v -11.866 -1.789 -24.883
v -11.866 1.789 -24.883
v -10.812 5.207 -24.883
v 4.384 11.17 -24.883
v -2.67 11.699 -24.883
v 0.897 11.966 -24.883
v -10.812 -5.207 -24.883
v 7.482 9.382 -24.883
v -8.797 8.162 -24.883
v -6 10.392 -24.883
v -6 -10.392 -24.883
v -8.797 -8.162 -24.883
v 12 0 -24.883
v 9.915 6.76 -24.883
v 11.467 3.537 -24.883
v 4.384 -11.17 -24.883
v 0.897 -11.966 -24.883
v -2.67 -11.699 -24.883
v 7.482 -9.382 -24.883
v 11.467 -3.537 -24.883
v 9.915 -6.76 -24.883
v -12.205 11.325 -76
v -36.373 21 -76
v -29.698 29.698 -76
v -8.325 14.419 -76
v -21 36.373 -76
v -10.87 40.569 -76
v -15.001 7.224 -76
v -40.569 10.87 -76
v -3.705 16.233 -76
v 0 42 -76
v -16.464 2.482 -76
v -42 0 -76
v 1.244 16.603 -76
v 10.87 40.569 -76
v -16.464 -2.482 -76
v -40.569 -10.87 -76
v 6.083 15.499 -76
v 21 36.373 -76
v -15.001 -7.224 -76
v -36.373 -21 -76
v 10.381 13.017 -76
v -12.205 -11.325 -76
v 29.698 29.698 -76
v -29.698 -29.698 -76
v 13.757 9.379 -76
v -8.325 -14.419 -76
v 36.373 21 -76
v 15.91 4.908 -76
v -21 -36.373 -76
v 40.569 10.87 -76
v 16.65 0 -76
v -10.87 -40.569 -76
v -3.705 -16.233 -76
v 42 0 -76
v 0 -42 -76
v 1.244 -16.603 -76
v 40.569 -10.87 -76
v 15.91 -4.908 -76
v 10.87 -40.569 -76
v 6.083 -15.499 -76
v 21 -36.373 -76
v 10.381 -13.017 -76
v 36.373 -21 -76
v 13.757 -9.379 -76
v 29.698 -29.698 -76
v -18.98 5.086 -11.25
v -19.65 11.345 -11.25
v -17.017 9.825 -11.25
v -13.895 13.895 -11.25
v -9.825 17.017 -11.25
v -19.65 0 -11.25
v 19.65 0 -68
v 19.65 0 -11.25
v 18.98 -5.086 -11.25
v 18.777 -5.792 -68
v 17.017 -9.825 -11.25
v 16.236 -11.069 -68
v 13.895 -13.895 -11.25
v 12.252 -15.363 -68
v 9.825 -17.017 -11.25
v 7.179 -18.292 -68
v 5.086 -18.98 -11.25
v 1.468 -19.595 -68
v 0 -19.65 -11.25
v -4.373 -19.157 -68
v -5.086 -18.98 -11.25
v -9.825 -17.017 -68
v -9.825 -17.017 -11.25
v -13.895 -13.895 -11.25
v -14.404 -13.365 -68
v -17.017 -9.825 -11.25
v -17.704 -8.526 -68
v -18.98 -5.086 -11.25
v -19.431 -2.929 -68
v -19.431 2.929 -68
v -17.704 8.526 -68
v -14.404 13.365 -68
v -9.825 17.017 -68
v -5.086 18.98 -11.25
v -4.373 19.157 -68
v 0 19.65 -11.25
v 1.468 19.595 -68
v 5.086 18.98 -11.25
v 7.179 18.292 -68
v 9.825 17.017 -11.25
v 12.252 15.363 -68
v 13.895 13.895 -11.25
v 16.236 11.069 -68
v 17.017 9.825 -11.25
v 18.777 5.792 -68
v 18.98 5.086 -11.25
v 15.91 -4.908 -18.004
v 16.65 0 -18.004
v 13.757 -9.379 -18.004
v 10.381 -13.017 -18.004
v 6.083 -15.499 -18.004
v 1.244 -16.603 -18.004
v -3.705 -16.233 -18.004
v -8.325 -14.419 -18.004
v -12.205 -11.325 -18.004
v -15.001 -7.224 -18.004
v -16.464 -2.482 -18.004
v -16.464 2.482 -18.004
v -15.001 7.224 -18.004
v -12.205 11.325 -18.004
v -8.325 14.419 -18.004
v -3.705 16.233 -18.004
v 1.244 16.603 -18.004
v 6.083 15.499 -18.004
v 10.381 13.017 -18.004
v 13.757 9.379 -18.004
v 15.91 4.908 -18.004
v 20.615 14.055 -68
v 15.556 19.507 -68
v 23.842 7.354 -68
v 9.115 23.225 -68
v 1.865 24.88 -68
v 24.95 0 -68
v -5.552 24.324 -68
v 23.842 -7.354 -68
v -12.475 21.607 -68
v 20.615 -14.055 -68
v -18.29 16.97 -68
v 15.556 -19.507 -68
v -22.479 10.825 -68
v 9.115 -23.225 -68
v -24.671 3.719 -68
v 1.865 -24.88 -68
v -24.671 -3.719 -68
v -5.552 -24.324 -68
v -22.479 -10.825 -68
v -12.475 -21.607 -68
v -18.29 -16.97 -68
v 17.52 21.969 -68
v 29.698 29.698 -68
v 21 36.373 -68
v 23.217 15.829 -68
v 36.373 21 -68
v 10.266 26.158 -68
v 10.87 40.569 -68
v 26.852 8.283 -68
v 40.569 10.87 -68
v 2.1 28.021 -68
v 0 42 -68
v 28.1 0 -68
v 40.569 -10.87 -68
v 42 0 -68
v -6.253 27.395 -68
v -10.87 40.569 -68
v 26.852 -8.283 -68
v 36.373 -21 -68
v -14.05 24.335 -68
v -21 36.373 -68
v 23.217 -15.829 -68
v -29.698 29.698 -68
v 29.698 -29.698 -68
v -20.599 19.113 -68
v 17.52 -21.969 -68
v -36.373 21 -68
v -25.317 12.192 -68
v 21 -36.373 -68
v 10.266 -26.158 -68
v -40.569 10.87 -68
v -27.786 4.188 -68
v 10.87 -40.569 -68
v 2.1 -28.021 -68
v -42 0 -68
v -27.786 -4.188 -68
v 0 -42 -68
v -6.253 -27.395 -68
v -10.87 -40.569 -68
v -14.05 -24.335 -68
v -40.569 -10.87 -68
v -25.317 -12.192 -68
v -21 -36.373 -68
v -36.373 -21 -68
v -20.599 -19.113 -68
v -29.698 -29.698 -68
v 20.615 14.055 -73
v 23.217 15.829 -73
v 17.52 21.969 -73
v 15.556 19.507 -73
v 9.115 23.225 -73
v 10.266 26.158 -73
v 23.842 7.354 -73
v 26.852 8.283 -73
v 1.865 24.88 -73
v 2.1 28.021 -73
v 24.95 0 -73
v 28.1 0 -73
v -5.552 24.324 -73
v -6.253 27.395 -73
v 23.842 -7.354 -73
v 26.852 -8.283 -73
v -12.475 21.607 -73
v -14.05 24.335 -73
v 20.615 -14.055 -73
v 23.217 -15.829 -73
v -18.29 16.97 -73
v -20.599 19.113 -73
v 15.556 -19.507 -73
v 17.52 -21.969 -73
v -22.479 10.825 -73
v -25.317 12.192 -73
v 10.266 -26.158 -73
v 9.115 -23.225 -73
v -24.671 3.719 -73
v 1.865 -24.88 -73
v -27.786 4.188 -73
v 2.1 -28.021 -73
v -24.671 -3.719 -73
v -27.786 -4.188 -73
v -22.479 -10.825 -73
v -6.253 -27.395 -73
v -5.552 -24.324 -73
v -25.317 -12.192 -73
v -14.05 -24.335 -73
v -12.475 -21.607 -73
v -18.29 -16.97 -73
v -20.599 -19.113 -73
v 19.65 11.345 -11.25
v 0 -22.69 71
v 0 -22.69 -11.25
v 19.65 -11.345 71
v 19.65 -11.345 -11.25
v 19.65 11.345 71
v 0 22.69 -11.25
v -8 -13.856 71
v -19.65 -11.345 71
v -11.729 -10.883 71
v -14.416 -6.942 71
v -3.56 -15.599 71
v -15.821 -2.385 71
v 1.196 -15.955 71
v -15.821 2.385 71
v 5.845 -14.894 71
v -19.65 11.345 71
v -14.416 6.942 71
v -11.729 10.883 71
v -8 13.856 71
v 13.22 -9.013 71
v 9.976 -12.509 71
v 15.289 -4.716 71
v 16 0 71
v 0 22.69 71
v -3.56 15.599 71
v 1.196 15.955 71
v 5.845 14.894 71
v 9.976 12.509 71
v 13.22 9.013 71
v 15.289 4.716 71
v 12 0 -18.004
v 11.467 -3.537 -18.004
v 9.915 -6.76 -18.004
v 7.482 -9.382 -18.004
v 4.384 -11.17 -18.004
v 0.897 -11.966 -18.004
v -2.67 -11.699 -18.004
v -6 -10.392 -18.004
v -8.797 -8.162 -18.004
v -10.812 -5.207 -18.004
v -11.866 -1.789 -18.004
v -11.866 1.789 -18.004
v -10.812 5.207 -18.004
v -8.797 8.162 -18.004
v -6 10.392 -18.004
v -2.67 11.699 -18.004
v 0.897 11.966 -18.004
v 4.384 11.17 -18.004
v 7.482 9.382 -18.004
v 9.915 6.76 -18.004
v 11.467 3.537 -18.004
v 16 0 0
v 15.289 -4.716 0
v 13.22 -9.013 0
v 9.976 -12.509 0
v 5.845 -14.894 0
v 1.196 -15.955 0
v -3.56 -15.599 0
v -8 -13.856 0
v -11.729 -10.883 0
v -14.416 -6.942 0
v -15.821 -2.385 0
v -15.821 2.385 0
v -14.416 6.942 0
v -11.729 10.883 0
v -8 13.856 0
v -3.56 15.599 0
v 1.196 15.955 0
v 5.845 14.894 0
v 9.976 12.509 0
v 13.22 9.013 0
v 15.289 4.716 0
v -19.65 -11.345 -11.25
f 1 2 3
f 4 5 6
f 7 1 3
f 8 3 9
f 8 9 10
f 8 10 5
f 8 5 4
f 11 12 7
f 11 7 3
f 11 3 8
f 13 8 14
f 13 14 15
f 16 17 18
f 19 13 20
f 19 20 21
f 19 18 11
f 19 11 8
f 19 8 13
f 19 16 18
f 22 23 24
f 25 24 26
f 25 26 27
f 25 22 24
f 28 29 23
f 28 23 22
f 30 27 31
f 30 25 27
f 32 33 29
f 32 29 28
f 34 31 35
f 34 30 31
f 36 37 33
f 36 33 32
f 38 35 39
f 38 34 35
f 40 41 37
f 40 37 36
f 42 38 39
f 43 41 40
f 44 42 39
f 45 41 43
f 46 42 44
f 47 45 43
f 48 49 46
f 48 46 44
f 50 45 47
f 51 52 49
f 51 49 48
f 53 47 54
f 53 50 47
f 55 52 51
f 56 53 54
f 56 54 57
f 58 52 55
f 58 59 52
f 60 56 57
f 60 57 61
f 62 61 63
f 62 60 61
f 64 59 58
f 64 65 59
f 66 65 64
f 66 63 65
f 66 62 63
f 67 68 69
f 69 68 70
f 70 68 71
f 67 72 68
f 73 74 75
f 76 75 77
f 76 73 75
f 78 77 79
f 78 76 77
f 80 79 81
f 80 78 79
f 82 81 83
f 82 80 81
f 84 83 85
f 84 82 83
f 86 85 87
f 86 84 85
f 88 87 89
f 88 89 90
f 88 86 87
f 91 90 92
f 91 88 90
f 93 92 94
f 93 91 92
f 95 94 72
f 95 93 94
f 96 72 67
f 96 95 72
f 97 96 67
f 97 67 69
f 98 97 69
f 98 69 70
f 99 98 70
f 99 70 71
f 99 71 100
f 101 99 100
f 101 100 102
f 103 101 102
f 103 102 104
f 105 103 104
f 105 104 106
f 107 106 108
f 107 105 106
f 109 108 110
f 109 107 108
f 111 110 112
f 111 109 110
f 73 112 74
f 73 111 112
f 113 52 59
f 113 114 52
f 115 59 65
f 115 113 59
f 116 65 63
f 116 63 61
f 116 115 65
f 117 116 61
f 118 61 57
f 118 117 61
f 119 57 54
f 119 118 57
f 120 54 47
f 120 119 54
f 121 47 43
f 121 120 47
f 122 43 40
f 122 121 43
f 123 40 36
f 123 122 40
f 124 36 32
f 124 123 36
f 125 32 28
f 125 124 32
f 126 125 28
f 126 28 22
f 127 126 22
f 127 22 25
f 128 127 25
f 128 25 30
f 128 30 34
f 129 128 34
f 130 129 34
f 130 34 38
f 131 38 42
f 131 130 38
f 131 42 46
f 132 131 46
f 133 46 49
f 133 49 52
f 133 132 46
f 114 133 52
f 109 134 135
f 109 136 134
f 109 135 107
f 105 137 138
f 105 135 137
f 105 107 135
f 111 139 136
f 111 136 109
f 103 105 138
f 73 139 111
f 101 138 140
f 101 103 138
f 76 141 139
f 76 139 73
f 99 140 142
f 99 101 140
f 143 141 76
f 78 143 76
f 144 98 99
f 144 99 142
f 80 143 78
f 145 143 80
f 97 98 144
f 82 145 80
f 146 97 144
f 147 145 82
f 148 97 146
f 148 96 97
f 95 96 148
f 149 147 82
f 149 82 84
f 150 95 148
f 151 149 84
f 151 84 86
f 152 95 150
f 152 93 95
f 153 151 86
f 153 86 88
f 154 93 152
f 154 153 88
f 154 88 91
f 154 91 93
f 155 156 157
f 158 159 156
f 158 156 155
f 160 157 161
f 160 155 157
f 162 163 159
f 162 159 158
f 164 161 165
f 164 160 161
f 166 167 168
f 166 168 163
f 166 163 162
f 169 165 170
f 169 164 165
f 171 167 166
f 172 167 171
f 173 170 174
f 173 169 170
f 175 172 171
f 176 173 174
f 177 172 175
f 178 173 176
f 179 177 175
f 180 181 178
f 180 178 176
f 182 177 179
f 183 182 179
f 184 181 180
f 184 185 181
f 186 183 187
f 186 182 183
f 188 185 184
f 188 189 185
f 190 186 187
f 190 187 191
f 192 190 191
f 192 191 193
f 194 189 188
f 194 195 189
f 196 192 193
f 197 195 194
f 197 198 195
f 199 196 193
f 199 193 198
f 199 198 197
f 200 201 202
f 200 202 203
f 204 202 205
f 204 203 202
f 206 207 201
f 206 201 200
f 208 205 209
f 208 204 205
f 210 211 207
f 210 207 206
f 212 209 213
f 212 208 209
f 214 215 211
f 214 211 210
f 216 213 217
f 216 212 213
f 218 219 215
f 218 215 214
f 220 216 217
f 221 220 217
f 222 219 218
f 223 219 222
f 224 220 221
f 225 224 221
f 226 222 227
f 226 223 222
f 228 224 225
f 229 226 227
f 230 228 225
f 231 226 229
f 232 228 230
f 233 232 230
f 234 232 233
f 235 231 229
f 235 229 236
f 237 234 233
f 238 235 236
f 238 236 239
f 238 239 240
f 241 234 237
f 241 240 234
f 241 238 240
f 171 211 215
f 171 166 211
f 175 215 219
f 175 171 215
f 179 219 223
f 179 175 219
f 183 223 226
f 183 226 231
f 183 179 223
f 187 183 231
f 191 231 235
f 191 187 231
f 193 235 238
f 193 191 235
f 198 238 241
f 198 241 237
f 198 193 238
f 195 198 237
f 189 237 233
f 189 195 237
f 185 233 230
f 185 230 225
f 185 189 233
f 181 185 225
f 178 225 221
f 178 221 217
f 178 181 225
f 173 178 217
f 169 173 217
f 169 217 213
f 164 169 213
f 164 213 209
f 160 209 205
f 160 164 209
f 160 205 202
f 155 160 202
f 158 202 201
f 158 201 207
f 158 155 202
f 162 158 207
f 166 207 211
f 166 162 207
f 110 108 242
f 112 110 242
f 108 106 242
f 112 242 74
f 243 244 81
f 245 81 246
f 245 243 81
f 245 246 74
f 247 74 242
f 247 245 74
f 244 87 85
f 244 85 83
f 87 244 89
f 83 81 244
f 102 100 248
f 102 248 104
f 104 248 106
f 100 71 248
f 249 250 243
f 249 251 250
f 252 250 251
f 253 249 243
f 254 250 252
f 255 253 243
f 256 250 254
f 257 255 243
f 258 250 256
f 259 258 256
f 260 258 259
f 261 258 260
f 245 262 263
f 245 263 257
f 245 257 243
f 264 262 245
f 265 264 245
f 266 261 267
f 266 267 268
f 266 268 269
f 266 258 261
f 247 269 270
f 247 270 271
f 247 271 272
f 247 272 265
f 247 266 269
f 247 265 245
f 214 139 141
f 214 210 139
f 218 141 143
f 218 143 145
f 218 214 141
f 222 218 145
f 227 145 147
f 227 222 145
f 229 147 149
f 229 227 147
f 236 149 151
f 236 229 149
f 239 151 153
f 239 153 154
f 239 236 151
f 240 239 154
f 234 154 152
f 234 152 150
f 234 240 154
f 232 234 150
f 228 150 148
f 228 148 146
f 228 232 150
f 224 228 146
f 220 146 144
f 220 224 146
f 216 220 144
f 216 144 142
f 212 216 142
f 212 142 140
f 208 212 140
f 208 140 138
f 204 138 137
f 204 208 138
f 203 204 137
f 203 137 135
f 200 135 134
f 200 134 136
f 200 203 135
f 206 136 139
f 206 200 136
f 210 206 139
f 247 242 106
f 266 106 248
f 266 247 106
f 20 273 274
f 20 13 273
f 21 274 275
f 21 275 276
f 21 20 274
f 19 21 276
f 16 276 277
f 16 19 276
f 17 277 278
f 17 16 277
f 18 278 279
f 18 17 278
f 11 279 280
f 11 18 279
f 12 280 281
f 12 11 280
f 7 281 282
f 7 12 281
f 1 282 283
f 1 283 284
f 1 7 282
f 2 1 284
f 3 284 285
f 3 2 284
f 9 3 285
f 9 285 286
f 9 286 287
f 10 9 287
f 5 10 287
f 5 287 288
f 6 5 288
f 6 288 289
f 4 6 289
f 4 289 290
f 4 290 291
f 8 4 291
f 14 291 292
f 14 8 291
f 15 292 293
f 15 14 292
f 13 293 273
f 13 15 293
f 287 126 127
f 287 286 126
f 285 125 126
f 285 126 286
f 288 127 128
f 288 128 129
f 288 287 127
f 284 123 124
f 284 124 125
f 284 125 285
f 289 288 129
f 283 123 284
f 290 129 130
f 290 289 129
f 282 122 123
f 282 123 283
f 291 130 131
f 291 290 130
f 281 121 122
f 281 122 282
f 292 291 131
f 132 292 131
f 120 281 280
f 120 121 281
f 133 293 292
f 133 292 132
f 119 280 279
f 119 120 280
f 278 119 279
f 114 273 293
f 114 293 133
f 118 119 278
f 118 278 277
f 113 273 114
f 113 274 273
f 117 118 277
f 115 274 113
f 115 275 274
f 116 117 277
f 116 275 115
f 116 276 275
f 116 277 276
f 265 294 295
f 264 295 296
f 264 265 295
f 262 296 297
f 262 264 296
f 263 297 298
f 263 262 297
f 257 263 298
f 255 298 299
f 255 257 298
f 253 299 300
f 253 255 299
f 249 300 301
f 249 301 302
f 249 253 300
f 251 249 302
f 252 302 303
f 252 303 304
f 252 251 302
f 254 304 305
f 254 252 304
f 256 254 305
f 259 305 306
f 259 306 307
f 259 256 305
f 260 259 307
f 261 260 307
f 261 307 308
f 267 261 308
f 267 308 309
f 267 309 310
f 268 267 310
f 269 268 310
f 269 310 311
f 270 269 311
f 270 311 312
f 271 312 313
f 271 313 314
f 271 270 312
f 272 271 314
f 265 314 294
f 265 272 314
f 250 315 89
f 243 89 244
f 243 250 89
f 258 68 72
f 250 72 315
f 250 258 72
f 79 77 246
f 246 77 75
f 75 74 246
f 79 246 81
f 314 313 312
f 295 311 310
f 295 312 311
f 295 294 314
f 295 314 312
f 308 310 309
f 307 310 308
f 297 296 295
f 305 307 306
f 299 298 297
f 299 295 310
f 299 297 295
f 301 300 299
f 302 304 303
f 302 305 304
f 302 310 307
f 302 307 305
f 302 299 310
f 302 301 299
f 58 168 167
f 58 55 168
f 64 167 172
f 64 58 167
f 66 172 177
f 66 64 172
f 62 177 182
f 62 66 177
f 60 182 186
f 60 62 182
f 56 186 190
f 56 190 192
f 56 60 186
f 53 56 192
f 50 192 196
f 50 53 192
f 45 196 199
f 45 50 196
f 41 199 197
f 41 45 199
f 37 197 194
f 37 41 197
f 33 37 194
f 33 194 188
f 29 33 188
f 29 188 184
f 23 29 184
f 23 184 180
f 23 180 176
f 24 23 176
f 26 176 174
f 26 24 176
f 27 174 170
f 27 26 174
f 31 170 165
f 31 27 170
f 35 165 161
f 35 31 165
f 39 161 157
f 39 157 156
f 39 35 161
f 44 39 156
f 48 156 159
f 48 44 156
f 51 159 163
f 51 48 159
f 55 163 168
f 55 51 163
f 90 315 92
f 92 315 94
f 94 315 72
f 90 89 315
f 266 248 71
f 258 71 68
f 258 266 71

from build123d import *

# Parameters (mm, degrees)
SKETCH2_R           = 16
BOSS_EXTRUDE1_DEPTH = 82.25


with BuildPart() as part:
    # Sketch1 → Revolve1 (revolve)
    with BuildSketch(Plane(origin=(0, 0, 0), x_dir=(1, 0, 0), z_dir=(0, 1, 0))):
        Polygon((0, 0), (16, 0), (16, -71), (19.65, -71), (19.65, 68), (24.95, 68), (24.95, 73), (28.1, 73), (28.1, 68), (42, 68), (42, 76), (16.65, 76), (16.65, 18.004366875), (12, 18.004366875), (12, 24.882682167), (0, 24.882682167), align=None)
    revolve(axis=Axis((0, 0, 39.840023079), (0, 0, -1)))

    # Sketch2 → Boss-Extrude1 (add)
    with BuildSketch(Plane.XY.offset(71)):
        Polygon((0, 22.689865579), (-19.65, 11.34493279), (-19.65, -11.34493279), (0, -22.689865579), (19.65, -11.34493279), (19.65, 11.34493279), align=None)
        Circle(SKETCH2_R, mode=Mode.SUBTRACT)
    extrude(amount=-BOSS_EXTRUDE1_DEPTH)


solid = part.part
